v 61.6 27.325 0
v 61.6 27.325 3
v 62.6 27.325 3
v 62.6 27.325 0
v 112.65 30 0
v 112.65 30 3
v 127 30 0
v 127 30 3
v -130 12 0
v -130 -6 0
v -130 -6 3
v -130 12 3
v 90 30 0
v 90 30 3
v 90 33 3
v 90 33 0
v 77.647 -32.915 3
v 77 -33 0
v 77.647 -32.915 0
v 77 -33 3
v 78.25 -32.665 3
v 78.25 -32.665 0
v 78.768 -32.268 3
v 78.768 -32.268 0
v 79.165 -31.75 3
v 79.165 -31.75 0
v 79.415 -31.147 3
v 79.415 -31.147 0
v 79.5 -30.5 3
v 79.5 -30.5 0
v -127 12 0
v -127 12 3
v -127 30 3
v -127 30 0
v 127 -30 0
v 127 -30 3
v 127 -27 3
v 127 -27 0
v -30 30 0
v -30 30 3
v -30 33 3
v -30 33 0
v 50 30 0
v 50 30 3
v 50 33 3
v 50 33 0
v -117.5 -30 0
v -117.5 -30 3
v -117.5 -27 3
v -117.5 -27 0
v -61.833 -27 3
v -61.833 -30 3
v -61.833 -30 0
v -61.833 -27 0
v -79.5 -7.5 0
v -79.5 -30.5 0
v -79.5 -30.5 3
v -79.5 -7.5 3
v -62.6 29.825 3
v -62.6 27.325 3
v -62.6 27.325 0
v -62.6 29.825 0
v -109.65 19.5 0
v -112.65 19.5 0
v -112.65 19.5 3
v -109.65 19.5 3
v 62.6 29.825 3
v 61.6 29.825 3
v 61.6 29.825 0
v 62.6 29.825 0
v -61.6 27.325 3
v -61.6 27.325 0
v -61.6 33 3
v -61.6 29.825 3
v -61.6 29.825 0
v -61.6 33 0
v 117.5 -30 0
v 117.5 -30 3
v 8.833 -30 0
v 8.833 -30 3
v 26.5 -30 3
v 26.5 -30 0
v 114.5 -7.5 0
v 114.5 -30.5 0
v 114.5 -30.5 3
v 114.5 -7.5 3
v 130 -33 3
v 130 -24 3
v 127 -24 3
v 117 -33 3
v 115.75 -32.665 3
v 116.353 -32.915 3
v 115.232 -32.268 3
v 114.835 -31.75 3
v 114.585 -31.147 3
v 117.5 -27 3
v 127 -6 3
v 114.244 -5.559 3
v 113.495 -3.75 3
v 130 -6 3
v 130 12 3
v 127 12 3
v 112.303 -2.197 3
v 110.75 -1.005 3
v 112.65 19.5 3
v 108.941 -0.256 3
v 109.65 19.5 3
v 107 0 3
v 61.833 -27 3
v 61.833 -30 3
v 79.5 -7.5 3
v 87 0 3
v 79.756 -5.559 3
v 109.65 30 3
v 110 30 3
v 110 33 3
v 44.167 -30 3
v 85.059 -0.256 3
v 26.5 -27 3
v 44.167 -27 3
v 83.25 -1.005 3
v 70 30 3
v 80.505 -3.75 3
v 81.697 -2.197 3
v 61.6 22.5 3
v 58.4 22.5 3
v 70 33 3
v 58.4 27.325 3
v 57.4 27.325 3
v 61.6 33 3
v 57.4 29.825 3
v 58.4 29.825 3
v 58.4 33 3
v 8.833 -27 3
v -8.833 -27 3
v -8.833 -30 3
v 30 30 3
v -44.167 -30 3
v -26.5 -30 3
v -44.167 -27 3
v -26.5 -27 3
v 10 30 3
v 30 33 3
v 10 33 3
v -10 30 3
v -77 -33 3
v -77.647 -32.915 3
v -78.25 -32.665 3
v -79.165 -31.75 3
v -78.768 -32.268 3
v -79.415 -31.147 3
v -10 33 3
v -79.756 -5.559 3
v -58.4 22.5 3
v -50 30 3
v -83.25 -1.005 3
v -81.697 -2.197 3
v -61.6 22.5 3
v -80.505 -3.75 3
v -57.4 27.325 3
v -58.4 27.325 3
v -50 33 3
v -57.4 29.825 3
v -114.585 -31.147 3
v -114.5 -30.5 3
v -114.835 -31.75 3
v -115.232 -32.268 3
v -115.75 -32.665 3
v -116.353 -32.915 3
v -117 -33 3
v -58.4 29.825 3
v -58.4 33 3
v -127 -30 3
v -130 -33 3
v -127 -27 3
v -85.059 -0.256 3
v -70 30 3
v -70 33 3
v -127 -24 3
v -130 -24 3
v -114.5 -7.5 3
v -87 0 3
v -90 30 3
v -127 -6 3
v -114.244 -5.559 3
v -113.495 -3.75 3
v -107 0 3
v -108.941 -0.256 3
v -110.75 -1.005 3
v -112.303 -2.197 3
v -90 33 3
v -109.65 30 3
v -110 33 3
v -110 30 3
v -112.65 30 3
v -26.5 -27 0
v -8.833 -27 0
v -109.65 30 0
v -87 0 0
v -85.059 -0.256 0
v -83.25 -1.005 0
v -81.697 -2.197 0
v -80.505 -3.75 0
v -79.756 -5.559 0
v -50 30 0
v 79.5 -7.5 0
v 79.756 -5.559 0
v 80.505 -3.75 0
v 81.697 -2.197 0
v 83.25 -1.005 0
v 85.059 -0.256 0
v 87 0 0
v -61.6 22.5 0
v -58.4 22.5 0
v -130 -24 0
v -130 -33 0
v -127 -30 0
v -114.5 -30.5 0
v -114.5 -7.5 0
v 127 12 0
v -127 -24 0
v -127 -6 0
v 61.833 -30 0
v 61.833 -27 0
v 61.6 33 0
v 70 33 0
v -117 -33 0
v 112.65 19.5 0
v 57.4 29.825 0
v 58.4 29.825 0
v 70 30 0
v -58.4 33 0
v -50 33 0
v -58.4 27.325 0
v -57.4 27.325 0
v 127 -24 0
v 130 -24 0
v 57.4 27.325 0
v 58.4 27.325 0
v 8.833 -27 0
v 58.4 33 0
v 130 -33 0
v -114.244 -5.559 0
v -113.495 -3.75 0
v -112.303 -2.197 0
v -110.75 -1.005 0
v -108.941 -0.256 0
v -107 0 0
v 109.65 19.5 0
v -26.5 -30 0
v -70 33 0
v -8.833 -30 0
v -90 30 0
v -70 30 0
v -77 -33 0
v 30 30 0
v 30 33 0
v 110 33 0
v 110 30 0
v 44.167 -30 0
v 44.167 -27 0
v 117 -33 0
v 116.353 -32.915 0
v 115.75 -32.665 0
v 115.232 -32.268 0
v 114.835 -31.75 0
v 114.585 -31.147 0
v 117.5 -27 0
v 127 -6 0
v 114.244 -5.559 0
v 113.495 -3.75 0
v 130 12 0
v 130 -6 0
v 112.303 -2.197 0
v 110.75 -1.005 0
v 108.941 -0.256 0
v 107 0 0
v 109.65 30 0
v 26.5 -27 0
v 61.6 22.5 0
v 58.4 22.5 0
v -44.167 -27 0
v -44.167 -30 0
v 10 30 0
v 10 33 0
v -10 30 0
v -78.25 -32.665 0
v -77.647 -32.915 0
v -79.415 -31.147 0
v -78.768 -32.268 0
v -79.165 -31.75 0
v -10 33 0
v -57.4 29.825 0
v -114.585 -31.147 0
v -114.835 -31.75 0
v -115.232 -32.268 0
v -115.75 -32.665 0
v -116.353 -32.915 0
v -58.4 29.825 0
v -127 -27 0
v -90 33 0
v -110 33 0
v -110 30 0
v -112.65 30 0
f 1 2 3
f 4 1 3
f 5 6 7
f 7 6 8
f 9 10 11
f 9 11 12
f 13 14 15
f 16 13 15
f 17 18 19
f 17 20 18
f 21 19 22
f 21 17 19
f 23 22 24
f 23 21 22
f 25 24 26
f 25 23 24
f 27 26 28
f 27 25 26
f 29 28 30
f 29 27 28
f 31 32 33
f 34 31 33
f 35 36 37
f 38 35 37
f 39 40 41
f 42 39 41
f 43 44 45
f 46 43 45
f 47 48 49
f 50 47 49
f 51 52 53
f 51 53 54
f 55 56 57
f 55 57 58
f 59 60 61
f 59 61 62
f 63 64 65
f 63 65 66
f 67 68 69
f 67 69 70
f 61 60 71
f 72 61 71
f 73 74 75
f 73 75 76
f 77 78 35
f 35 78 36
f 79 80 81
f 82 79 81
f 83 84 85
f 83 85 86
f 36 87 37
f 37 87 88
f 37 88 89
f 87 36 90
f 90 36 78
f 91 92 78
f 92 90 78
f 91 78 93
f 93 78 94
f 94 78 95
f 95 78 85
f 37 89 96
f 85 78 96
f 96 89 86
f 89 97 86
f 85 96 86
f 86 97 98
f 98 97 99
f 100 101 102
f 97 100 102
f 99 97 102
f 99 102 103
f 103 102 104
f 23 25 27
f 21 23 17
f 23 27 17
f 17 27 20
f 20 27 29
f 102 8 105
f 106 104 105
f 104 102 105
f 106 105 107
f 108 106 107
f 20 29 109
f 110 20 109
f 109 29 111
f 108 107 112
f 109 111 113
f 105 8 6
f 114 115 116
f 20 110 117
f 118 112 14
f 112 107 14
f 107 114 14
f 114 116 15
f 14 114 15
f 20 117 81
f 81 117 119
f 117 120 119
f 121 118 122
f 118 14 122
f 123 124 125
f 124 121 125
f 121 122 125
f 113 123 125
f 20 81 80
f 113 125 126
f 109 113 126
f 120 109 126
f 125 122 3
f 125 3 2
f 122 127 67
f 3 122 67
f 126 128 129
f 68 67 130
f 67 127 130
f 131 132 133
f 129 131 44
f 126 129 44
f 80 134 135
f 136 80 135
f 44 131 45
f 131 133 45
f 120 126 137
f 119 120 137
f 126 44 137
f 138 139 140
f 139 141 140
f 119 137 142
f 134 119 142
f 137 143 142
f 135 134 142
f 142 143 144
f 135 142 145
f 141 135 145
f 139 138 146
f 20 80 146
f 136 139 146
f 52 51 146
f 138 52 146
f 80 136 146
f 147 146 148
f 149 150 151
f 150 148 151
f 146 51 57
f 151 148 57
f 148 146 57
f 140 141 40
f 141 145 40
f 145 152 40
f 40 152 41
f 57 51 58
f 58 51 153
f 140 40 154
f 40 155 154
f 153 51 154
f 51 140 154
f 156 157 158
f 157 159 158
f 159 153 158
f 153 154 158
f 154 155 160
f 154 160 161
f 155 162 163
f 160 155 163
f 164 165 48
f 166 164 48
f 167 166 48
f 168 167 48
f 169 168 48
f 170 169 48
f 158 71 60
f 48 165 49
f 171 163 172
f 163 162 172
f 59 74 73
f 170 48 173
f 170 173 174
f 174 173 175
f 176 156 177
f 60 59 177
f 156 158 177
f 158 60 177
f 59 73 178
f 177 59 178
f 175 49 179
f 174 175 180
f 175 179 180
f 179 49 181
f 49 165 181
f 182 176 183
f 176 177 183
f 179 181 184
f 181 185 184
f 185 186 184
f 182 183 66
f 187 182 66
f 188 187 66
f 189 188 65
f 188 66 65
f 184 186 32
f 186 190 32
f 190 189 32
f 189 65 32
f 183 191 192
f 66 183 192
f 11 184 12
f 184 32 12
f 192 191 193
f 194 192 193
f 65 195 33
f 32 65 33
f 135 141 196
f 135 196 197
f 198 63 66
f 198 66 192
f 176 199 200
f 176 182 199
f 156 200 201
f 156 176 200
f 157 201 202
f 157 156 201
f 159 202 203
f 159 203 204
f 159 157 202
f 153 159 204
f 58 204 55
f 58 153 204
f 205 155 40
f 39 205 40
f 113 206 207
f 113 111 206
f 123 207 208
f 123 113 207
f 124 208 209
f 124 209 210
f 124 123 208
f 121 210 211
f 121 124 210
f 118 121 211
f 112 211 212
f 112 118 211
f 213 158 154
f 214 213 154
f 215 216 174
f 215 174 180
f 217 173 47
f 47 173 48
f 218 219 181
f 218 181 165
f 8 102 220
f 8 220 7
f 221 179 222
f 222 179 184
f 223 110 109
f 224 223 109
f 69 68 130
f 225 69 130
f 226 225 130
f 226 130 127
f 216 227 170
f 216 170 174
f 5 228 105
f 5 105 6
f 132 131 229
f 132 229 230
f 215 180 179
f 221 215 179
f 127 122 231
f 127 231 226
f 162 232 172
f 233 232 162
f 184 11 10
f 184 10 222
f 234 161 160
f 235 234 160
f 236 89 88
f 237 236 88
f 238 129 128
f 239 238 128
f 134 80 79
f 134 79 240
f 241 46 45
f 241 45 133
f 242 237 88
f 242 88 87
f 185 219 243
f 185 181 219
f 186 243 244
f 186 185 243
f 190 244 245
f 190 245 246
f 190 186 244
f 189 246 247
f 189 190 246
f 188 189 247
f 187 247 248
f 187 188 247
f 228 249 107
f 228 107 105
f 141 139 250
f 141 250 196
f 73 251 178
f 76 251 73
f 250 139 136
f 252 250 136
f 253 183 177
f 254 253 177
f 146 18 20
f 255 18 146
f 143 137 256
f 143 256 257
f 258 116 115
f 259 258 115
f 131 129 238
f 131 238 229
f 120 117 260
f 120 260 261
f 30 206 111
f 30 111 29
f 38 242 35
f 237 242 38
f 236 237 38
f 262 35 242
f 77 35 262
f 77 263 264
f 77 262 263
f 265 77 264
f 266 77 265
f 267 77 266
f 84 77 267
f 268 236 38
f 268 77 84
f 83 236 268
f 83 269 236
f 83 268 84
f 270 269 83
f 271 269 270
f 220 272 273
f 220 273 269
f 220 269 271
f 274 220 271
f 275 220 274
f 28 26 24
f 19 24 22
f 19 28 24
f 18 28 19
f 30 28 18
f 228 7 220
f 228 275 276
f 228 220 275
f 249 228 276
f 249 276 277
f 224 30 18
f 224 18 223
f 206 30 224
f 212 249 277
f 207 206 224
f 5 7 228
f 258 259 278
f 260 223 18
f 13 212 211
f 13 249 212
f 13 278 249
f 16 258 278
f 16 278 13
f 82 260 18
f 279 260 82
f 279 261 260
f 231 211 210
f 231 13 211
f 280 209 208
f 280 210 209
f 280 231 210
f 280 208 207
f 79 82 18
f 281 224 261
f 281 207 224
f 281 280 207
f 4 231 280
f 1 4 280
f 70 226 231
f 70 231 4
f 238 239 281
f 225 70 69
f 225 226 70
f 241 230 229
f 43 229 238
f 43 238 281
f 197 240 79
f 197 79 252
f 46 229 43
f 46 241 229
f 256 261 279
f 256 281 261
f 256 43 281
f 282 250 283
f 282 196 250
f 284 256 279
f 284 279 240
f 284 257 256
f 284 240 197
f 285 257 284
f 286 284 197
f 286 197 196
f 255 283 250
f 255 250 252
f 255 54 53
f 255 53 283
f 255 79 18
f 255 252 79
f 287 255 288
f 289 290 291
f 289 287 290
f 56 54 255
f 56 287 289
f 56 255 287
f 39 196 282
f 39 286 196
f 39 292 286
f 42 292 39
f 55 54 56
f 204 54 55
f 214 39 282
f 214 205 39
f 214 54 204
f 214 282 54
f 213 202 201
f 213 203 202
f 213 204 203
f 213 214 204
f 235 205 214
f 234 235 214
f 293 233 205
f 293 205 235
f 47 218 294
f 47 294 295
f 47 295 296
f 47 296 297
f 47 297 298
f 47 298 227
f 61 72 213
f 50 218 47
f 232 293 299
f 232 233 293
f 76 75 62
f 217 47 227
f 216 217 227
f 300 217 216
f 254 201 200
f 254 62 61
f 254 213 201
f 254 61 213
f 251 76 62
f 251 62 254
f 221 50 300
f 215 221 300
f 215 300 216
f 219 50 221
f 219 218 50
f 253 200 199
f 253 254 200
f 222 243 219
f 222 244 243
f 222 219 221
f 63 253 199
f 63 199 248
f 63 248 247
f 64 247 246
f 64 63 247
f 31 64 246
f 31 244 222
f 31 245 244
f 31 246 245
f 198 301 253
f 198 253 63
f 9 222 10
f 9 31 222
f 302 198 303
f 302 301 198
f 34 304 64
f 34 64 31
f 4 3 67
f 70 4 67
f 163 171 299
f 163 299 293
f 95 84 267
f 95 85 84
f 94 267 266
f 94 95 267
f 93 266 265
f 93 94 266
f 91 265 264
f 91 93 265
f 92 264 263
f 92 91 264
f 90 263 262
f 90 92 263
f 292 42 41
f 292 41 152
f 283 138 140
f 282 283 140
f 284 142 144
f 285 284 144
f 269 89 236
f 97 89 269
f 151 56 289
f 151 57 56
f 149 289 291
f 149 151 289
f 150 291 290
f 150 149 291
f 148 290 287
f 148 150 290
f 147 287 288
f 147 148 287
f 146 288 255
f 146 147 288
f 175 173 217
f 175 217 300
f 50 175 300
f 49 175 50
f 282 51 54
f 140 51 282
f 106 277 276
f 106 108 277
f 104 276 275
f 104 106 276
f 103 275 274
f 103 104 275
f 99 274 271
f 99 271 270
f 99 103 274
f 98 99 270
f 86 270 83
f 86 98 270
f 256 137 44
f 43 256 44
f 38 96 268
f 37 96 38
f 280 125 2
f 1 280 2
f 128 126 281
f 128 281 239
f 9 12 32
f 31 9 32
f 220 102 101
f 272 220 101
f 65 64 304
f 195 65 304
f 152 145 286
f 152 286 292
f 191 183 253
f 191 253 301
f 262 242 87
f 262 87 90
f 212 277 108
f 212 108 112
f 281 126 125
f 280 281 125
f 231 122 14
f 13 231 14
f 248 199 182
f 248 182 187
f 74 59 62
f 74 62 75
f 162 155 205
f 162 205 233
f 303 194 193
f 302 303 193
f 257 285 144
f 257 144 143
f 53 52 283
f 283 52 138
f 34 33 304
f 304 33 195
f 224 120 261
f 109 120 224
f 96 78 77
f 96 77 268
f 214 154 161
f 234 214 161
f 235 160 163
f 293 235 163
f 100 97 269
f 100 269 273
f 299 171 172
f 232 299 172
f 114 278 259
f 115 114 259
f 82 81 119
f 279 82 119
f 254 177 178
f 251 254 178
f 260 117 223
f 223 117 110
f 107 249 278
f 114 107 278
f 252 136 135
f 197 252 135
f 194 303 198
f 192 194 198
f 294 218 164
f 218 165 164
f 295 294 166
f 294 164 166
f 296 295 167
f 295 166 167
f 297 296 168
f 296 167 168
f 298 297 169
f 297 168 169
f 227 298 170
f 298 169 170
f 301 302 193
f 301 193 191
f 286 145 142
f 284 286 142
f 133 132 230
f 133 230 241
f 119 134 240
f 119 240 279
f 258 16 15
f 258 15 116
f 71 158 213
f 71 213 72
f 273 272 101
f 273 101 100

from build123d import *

# Parameters (mm, degrees)
BOSS_EXTRUDE1_DEPTH     = 3
SKETCH2_W               = 3
SKETCH2_H               = 18
SKETCH2_W_2             = 17.666666666
SKETCH2_H_2             = 3
SKETCH2_W_3             = 17.666666667
SKETCH2_W_4             = 9.5
SKETCH2_W_5             = 20
CUT_EXTRUDE1_DEPTH      = 1
CUT_EXTRUDE1_DEPTH_BACK = 4
SKETCH3_W               = 3.2
SKETCH3_H               = 10.5
SKETCH3_W_2             = 5.2
SKETCH3_H_2             = 2.5
CUT_EXTRUDE2_DEPTH      = 1
CUT_EXTRUDE2_DEPTH_BACK = 4
FILLET1_R               = 7.5
FILLET2_R               = 2.5
SKETCH4_W               = 3
SKETCH4_H               = 10.5
CUT_EXTRUDE3_DEPTH      = 4
CUT_EXTRUDE3_DEPTH_BACK = 1


with BuildPart() as part:
    # Sketch1 → Boss-Extrude1 (new body)
    with BuildSketch(Plane.XY):
        Polygon((-130, 33), (130, 33), (130, -33), (114.5, -33), (114.5, 0), (79.5, 0), (79.5, -33), (-79.5, -33), (-79.5, 0), (-114.5, 0), (-114.5, -33), (-130, -33), align=None)
    extrude(amount=BOSS_EXTRUDE1_DEPTH)

    # Sketch2 → Cut-Extrude1 (cut, two sides)
    with BuildSketch(Plane.XY.offset(3)) as cut_extrude1_sk:
        with Locations((-128.5, 21)):
            Rectangle(SKETCH2_W, SKETCH2_H)
        with Locations((-128.5, -15)):
            Rectangle(SKETCH2_W, SKETCH2_H)
        with Locations((-53, -28.5)):
            Rectangle(SKETCH2_W_2, SKETCH2_H_2)
        with Locations((-17.666666666, -28.5)):
            Rectangle(SKETCH2_W_3, SKETCH2_H_2)
        with Locations((17.666666666, -28.5)):
            Rectangle(SKETCH2_W_3, SKETCH2_H_2)
        with Locations((53, -28.5)):
            Rectangle(SKETCH2_W_2, SKETCH2_H_2)
        with Locations((122.25, -28.5)):
            Rectangle(SKETCH2_W_4, SKETCH2_H_2)
        with Locations((128.5, -15)):
            Rectangle(SKETCH2_W, SKETCH2_H)
        with Locations((128.5, 21)):
            Rectangle(SKETCH2_W, SKETCH2_H)
        Polygon((130, 33), (110, 33), (110, 30), (127, 30), (130, 30), align=None)
        with Locations((80, 31.5)):
            Rectangle(SKETCH2_W_5, SKETCH2_H_2)
        with Locations((40, 31.5)):
            Rectangle(SKETCH2_W_5, SKETCH2_H_2)
        with Locations((-40, 31.5)):
            Rectangle(SKETCH2_W_5, SKETCH2_H_2)
        with Locations((-80, 31.5)):
            Rectangle(SKETCH2_W_5, SKETCH2_H_2)
        with Locations((0, 31.5)):
            Rectangle(SKETCH2_W_5, SKETCH2_H_2)
        with Locations((-120, 31.5)):
            Rectangle(SKETCH2_W_5, SKETCH2_H_2)
        with Locations((-122.25, -28.5)):
            Rectangle(SKETCH2_W_4, SKETCH2_H_2)
    extrude(amount=CUT_EXTRUDE1_DEPTH, mode=Mode.SUBTRACT)
    extrude(cut_extrude1_sk.sketch, amount=-CUT_EXTRUDE1_DEPTH_BACK, mode=Mode.SUBTRACT)

    # Sketch3 → Cut-Extrude2 (cut, two sides)
    with BuildSketch(Plane.XY.offset(3)) as cut_extrude2_sk:
        with Locations((-60, 27.75)):
            Rectangle(SKETCH3_W, SKETCH3_H)
        with Locations((60, 27.75)):
            Rectangle(SKETCH3_W, SKETCH3_H)
        with Locations((-60, 28.575)):
            Rectangle(SKETCH3_W_2, SKETCH3_H_2)
        with Locations((60, 28.575)):
            Rectangle(SKETCH3_W_2, SKETCH3_H_2)
    extrude(amount=CUT_EXTRUDE2_DEPTH, mode=Mode.SUBTRACT)
    extrude(cut_extrude2_sk.sketch, amount=-CUT_EXTRUDE2_DEPTH_BACK, mode=Mode.SUBTRACT)

    # Fillet1
    fillet1_edges = [part.edges().sort_by_distance(p)[0] for p in [
        (114.5, 0, 1.5),
        (79.5, 0, 1.5),
        (-79.5, 0, 1.5),
        (-114.5, 0, 1.5),
    ]]
    fillet(fillet1_edges, radius=FILLET1_R)

    # Fillet2
    fillet2_edges = [part.edges().sort_by_distance(p)[0] for p in [
        (114.5, -33, 1.5),
        (79.5, -33, 1.5),
        (-79.5, -33, 1.5),
        (-114.5, -33, 1.5),
    ]]
    fillet(fillet2_edges, radius=FILLET2_R)

    # Sketch4 → Cut-Extrude3 (cut, two sides)
    with BuildSketch(Plane.XY) as cut_extrude3_sk:
        with Locations((-111.15, 24.75)):
            Rectangle(SKETCH4_W, SKETCH4_H)
        with Locations((111.15, 24.75)):
            Rectangle(SKETCH4_W, SKETCH4_H)
    extrude(amount=CUT_EXTRUDE3_DEPTH, mode=Mode.SUBTRACT)
    extrude(cut_extrude3_sk.sketch, amount=-CUT_EXTRUDE3_DEPTH_BACK, mode=Mode.SUBTRACT)


solid = part.part
